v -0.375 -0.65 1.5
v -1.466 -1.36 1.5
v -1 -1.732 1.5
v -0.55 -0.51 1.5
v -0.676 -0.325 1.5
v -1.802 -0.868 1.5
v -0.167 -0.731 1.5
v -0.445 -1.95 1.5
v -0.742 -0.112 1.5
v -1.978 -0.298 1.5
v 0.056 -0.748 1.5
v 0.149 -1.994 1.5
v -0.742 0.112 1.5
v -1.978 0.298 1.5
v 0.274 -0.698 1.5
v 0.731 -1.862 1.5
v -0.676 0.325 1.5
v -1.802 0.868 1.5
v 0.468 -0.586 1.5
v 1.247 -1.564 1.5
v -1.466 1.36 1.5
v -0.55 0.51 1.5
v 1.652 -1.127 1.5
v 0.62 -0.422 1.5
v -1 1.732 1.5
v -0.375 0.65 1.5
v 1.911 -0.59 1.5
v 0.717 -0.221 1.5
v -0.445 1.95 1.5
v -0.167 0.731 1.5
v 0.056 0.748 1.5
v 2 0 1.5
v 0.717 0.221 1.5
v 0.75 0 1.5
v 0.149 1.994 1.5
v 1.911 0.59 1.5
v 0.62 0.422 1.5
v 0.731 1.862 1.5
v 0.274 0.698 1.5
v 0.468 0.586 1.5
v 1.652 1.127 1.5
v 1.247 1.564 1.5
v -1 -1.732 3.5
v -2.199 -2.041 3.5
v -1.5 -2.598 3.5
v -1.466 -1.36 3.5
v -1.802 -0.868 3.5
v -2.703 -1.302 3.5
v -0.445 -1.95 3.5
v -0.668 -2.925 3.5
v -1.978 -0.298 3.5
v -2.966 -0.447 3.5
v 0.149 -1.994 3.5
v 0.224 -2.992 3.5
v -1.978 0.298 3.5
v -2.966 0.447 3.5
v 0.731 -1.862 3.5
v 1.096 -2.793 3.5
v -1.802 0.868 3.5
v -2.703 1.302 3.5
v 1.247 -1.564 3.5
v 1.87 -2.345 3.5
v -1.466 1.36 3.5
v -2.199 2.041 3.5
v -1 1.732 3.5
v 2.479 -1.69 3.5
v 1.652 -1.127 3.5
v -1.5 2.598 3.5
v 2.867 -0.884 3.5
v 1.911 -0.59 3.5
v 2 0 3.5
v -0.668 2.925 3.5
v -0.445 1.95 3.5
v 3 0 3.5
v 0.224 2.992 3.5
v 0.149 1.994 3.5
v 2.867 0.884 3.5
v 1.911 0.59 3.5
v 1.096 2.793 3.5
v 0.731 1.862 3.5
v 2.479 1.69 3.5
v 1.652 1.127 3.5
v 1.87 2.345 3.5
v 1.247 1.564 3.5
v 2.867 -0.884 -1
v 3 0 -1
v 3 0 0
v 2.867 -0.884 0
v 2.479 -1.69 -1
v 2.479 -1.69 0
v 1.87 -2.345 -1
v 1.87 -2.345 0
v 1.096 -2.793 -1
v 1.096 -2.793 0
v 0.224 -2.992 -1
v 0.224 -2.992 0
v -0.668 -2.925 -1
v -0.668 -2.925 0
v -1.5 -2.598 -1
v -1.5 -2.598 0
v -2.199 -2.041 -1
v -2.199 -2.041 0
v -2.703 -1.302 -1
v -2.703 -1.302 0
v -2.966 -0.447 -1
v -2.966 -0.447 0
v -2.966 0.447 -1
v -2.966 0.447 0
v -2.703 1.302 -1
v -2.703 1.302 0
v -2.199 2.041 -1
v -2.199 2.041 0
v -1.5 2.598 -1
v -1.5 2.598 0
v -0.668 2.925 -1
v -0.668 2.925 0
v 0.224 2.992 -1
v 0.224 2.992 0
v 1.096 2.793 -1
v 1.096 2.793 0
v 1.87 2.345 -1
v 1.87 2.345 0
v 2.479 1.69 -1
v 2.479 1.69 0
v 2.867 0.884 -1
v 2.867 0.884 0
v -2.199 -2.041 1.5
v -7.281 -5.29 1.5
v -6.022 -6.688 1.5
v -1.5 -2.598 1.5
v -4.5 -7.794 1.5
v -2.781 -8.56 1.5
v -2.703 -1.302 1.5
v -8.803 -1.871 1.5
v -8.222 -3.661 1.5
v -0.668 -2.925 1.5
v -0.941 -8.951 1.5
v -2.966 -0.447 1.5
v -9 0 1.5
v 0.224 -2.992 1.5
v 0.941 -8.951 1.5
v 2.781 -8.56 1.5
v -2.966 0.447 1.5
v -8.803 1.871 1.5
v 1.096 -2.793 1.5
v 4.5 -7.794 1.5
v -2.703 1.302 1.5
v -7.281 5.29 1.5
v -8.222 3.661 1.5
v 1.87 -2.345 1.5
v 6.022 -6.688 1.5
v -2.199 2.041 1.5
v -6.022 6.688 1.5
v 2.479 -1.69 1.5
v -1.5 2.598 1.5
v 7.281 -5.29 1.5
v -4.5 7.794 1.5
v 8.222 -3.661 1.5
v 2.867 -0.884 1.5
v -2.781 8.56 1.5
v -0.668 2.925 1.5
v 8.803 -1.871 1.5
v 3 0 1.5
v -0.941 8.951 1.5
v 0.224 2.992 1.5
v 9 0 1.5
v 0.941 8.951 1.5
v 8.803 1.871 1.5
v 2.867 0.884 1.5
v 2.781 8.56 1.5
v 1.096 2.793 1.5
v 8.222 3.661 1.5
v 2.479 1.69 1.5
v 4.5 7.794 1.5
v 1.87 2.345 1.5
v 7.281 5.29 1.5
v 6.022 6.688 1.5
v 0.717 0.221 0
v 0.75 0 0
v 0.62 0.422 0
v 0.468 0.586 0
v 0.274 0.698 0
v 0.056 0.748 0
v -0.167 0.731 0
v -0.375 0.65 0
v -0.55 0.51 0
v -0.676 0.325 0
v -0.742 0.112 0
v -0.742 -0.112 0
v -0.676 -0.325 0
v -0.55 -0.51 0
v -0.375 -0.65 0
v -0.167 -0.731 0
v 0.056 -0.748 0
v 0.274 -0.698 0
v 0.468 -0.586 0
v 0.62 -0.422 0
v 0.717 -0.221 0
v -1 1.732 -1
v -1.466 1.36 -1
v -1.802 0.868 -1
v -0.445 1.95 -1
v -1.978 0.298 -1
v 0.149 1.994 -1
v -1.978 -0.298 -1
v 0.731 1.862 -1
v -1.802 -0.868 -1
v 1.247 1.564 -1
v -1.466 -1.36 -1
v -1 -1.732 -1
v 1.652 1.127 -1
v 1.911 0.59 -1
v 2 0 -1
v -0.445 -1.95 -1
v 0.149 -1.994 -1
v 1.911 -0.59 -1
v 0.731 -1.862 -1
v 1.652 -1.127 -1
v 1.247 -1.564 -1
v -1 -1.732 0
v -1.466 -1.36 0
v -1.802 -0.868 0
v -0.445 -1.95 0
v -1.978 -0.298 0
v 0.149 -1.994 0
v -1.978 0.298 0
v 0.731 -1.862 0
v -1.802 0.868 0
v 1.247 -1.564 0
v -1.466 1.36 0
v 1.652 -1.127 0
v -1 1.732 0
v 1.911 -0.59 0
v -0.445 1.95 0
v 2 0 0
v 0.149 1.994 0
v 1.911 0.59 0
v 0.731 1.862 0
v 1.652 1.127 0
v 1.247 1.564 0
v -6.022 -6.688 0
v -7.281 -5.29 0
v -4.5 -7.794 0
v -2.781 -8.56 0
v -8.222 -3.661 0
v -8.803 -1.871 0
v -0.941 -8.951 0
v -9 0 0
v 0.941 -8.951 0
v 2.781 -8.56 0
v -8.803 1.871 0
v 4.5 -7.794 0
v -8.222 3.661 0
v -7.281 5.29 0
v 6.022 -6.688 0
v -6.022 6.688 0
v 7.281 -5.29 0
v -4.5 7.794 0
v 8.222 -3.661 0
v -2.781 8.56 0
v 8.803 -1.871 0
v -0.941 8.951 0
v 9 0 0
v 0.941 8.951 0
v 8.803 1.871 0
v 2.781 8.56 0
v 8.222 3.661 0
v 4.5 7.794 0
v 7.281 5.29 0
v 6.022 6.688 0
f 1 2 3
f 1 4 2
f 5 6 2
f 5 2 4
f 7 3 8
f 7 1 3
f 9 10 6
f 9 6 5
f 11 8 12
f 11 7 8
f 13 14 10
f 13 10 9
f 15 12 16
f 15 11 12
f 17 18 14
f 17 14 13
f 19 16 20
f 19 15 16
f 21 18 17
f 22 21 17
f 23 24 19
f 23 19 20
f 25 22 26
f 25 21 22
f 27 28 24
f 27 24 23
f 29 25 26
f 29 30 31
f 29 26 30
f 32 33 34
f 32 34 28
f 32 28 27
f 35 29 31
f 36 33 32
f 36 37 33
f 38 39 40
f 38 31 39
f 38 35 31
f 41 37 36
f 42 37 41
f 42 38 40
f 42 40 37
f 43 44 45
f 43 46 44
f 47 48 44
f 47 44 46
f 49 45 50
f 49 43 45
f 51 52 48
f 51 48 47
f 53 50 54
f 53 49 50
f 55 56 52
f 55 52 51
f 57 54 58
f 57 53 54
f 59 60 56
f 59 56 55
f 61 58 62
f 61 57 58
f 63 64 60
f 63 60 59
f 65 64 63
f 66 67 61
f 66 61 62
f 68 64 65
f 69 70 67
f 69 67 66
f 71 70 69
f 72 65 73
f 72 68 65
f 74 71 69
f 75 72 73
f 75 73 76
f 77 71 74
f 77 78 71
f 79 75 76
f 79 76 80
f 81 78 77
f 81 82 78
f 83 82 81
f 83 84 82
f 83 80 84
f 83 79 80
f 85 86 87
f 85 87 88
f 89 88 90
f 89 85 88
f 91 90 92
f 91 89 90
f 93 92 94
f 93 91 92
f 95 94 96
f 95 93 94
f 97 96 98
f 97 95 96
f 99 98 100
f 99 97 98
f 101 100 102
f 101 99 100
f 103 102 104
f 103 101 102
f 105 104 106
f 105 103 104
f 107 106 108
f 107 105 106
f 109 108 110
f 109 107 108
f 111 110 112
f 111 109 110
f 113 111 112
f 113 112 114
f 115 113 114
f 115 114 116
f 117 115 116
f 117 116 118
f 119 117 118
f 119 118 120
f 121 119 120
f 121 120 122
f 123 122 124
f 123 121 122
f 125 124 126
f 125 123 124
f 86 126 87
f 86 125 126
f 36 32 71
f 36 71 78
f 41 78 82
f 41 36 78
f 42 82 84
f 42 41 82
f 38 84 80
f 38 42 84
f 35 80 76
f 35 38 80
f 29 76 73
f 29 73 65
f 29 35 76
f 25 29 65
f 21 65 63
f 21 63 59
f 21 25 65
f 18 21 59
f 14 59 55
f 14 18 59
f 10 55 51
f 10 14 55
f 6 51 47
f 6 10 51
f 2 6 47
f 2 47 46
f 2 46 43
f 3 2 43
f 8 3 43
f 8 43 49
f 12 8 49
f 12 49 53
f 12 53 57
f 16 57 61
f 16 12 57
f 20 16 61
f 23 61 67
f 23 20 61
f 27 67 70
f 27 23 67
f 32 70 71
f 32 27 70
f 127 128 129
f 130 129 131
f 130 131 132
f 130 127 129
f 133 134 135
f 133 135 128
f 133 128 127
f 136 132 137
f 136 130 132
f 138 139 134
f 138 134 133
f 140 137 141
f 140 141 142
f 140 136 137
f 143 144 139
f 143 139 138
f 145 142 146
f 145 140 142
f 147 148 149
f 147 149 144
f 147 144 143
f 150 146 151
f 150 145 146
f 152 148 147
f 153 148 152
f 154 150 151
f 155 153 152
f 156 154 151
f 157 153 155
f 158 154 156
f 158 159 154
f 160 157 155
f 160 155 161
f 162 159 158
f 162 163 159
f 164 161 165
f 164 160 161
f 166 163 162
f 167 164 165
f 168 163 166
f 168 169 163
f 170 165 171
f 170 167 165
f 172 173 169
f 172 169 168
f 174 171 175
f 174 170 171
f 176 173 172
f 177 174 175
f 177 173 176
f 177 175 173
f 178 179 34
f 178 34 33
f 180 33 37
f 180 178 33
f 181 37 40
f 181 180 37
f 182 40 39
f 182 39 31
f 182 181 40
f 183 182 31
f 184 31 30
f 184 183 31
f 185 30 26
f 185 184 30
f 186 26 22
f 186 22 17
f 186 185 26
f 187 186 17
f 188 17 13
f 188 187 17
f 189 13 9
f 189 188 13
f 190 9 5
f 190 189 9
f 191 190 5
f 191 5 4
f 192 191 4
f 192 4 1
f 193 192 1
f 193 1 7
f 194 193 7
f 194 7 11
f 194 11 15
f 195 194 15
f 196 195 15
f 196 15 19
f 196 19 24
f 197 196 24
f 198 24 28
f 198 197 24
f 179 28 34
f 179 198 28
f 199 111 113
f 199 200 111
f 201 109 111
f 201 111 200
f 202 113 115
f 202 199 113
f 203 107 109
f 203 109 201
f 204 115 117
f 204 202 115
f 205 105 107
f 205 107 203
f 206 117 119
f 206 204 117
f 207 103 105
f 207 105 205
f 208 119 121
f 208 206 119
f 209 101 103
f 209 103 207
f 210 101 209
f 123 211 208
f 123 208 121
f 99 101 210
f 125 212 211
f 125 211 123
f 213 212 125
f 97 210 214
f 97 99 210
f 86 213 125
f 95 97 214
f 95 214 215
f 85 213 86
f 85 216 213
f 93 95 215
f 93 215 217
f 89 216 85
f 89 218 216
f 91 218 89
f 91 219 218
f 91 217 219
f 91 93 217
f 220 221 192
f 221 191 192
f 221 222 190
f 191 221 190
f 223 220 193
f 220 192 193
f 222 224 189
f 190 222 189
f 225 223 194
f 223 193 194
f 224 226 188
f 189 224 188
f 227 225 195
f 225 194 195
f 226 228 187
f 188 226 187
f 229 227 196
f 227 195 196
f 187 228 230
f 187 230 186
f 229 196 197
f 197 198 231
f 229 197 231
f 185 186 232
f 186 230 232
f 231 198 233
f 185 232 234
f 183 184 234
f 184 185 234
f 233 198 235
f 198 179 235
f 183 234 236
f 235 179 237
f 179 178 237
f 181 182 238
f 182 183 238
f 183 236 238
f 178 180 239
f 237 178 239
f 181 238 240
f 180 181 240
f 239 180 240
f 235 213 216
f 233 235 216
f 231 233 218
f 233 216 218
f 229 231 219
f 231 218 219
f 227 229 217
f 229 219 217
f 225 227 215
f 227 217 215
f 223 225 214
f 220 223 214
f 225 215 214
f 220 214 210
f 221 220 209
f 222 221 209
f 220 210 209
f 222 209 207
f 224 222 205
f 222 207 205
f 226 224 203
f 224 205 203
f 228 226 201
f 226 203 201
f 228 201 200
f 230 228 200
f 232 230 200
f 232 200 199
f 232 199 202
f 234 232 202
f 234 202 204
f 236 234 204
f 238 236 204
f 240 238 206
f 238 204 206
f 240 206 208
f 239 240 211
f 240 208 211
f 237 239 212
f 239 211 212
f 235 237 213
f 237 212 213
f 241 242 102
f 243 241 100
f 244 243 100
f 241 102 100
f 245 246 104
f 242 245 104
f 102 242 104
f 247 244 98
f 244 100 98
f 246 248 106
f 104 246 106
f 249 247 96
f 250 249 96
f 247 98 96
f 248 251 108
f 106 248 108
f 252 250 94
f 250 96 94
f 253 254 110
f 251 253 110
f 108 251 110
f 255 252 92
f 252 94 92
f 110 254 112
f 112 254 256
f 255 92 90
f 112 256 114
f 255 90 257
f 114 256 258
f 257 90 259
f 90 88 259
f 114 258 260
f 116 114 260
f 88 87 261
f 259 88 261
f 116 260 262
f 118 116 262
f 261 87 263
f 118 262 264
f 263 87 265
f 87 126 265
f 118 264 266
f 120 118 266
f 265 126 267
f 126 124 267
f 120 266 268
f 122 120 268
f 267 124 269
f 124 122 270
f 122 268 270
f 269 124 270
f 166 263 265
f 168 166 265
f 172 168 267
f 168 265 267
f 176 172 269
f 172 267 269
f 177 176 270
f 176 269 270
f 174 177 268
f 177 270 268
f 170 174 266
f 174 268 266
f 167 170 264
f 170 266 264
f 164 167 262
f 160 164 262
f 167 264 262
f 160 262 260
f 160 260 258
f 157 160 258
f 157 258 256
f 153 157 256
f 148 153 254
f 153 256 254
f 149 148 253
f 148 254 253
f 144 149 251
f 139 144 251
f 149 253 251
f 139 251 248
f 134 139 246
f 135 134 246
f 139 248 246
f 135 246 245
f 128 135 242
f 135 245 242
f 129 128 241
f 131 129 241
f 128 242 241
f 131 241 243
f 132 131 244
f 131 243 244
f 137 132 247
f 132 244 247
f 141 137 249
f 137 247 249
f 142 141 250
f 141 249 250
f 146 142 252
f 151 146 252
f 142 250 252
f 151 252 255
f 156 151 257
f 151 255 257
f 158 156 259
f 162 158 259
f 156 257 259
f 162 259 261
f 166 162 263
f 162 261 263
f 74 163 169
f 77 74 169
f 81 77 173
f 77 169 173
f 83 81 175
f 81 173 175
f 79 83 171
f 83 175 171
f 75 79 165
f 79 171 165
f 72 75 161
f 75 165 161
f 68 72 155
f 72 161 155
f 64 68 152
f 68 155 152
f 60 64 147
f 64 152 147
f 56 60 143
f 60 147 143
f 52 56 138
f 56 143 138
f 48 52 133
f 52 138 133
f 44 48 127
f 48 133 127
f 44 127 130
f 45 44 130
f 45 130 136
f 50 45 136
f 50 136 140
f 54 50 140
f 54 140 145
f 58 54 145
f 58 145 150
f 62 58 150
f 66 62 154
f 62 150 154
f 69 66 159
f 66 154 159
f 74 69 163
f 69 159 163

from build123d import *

# Parameters (mm, degrees)
SKETCH_1_R      = 9
SKETCH_1_R_2    = 0.75
EXTRUDE_1_DEPTH = 1.5
SKETCH_2_R      = 3
SKETCH_2_R_2    = 2
EXTRUDE_2_DEPTH = 2
EXTRUDE_START   = 1
SKETCH_3_R      = 3
SKETCH_3_R_2    = 2
EXTRUDE_3_DEPTH = 1


with BuildPart() as part:
    # 草图1 → 凸台-拉伸1 (new body)
    with BuildSketch(Plane.XY):
        Circle(SKETCH_1_R)
        Circle(SKETCH_1_R_2, mode=Mode.SUBTRACT)
    extrude(amount=EXTRUDE_1_DEPTH)

    # 草图2 → 凸台-拉伸2 (add)
    with BuildSketch(Plane.XY.offset(1.5)):
        Circle(SKETCH_2_R)
        Circle(SKETCH_2_R_2, mode=Mode.SUBTRACT)
    extrude(amount=EXTRUDE_2_DEPTH)

    # 草图3 → 凸台-拉伸3 (add)
    with BuildSketch(Plane(origin=(0, 0, 0), x_dir=(-1, 0, 0), z_dir=(0, 0, -1)).offset(EXTRUDE_START)):
        with Locations(Location((0, 0, 0), (0, 0, 180))):
            Circle(SKETCH_3_R)
        with Locations(Location((0, 0, 0), (0, 0, 180))):
            Circle(SKETCH_3_R_2, mode=Mode.SUBTRACT)
    extrude(amount=-EXTRUDE_3_DEPTH)


solid = part.part
